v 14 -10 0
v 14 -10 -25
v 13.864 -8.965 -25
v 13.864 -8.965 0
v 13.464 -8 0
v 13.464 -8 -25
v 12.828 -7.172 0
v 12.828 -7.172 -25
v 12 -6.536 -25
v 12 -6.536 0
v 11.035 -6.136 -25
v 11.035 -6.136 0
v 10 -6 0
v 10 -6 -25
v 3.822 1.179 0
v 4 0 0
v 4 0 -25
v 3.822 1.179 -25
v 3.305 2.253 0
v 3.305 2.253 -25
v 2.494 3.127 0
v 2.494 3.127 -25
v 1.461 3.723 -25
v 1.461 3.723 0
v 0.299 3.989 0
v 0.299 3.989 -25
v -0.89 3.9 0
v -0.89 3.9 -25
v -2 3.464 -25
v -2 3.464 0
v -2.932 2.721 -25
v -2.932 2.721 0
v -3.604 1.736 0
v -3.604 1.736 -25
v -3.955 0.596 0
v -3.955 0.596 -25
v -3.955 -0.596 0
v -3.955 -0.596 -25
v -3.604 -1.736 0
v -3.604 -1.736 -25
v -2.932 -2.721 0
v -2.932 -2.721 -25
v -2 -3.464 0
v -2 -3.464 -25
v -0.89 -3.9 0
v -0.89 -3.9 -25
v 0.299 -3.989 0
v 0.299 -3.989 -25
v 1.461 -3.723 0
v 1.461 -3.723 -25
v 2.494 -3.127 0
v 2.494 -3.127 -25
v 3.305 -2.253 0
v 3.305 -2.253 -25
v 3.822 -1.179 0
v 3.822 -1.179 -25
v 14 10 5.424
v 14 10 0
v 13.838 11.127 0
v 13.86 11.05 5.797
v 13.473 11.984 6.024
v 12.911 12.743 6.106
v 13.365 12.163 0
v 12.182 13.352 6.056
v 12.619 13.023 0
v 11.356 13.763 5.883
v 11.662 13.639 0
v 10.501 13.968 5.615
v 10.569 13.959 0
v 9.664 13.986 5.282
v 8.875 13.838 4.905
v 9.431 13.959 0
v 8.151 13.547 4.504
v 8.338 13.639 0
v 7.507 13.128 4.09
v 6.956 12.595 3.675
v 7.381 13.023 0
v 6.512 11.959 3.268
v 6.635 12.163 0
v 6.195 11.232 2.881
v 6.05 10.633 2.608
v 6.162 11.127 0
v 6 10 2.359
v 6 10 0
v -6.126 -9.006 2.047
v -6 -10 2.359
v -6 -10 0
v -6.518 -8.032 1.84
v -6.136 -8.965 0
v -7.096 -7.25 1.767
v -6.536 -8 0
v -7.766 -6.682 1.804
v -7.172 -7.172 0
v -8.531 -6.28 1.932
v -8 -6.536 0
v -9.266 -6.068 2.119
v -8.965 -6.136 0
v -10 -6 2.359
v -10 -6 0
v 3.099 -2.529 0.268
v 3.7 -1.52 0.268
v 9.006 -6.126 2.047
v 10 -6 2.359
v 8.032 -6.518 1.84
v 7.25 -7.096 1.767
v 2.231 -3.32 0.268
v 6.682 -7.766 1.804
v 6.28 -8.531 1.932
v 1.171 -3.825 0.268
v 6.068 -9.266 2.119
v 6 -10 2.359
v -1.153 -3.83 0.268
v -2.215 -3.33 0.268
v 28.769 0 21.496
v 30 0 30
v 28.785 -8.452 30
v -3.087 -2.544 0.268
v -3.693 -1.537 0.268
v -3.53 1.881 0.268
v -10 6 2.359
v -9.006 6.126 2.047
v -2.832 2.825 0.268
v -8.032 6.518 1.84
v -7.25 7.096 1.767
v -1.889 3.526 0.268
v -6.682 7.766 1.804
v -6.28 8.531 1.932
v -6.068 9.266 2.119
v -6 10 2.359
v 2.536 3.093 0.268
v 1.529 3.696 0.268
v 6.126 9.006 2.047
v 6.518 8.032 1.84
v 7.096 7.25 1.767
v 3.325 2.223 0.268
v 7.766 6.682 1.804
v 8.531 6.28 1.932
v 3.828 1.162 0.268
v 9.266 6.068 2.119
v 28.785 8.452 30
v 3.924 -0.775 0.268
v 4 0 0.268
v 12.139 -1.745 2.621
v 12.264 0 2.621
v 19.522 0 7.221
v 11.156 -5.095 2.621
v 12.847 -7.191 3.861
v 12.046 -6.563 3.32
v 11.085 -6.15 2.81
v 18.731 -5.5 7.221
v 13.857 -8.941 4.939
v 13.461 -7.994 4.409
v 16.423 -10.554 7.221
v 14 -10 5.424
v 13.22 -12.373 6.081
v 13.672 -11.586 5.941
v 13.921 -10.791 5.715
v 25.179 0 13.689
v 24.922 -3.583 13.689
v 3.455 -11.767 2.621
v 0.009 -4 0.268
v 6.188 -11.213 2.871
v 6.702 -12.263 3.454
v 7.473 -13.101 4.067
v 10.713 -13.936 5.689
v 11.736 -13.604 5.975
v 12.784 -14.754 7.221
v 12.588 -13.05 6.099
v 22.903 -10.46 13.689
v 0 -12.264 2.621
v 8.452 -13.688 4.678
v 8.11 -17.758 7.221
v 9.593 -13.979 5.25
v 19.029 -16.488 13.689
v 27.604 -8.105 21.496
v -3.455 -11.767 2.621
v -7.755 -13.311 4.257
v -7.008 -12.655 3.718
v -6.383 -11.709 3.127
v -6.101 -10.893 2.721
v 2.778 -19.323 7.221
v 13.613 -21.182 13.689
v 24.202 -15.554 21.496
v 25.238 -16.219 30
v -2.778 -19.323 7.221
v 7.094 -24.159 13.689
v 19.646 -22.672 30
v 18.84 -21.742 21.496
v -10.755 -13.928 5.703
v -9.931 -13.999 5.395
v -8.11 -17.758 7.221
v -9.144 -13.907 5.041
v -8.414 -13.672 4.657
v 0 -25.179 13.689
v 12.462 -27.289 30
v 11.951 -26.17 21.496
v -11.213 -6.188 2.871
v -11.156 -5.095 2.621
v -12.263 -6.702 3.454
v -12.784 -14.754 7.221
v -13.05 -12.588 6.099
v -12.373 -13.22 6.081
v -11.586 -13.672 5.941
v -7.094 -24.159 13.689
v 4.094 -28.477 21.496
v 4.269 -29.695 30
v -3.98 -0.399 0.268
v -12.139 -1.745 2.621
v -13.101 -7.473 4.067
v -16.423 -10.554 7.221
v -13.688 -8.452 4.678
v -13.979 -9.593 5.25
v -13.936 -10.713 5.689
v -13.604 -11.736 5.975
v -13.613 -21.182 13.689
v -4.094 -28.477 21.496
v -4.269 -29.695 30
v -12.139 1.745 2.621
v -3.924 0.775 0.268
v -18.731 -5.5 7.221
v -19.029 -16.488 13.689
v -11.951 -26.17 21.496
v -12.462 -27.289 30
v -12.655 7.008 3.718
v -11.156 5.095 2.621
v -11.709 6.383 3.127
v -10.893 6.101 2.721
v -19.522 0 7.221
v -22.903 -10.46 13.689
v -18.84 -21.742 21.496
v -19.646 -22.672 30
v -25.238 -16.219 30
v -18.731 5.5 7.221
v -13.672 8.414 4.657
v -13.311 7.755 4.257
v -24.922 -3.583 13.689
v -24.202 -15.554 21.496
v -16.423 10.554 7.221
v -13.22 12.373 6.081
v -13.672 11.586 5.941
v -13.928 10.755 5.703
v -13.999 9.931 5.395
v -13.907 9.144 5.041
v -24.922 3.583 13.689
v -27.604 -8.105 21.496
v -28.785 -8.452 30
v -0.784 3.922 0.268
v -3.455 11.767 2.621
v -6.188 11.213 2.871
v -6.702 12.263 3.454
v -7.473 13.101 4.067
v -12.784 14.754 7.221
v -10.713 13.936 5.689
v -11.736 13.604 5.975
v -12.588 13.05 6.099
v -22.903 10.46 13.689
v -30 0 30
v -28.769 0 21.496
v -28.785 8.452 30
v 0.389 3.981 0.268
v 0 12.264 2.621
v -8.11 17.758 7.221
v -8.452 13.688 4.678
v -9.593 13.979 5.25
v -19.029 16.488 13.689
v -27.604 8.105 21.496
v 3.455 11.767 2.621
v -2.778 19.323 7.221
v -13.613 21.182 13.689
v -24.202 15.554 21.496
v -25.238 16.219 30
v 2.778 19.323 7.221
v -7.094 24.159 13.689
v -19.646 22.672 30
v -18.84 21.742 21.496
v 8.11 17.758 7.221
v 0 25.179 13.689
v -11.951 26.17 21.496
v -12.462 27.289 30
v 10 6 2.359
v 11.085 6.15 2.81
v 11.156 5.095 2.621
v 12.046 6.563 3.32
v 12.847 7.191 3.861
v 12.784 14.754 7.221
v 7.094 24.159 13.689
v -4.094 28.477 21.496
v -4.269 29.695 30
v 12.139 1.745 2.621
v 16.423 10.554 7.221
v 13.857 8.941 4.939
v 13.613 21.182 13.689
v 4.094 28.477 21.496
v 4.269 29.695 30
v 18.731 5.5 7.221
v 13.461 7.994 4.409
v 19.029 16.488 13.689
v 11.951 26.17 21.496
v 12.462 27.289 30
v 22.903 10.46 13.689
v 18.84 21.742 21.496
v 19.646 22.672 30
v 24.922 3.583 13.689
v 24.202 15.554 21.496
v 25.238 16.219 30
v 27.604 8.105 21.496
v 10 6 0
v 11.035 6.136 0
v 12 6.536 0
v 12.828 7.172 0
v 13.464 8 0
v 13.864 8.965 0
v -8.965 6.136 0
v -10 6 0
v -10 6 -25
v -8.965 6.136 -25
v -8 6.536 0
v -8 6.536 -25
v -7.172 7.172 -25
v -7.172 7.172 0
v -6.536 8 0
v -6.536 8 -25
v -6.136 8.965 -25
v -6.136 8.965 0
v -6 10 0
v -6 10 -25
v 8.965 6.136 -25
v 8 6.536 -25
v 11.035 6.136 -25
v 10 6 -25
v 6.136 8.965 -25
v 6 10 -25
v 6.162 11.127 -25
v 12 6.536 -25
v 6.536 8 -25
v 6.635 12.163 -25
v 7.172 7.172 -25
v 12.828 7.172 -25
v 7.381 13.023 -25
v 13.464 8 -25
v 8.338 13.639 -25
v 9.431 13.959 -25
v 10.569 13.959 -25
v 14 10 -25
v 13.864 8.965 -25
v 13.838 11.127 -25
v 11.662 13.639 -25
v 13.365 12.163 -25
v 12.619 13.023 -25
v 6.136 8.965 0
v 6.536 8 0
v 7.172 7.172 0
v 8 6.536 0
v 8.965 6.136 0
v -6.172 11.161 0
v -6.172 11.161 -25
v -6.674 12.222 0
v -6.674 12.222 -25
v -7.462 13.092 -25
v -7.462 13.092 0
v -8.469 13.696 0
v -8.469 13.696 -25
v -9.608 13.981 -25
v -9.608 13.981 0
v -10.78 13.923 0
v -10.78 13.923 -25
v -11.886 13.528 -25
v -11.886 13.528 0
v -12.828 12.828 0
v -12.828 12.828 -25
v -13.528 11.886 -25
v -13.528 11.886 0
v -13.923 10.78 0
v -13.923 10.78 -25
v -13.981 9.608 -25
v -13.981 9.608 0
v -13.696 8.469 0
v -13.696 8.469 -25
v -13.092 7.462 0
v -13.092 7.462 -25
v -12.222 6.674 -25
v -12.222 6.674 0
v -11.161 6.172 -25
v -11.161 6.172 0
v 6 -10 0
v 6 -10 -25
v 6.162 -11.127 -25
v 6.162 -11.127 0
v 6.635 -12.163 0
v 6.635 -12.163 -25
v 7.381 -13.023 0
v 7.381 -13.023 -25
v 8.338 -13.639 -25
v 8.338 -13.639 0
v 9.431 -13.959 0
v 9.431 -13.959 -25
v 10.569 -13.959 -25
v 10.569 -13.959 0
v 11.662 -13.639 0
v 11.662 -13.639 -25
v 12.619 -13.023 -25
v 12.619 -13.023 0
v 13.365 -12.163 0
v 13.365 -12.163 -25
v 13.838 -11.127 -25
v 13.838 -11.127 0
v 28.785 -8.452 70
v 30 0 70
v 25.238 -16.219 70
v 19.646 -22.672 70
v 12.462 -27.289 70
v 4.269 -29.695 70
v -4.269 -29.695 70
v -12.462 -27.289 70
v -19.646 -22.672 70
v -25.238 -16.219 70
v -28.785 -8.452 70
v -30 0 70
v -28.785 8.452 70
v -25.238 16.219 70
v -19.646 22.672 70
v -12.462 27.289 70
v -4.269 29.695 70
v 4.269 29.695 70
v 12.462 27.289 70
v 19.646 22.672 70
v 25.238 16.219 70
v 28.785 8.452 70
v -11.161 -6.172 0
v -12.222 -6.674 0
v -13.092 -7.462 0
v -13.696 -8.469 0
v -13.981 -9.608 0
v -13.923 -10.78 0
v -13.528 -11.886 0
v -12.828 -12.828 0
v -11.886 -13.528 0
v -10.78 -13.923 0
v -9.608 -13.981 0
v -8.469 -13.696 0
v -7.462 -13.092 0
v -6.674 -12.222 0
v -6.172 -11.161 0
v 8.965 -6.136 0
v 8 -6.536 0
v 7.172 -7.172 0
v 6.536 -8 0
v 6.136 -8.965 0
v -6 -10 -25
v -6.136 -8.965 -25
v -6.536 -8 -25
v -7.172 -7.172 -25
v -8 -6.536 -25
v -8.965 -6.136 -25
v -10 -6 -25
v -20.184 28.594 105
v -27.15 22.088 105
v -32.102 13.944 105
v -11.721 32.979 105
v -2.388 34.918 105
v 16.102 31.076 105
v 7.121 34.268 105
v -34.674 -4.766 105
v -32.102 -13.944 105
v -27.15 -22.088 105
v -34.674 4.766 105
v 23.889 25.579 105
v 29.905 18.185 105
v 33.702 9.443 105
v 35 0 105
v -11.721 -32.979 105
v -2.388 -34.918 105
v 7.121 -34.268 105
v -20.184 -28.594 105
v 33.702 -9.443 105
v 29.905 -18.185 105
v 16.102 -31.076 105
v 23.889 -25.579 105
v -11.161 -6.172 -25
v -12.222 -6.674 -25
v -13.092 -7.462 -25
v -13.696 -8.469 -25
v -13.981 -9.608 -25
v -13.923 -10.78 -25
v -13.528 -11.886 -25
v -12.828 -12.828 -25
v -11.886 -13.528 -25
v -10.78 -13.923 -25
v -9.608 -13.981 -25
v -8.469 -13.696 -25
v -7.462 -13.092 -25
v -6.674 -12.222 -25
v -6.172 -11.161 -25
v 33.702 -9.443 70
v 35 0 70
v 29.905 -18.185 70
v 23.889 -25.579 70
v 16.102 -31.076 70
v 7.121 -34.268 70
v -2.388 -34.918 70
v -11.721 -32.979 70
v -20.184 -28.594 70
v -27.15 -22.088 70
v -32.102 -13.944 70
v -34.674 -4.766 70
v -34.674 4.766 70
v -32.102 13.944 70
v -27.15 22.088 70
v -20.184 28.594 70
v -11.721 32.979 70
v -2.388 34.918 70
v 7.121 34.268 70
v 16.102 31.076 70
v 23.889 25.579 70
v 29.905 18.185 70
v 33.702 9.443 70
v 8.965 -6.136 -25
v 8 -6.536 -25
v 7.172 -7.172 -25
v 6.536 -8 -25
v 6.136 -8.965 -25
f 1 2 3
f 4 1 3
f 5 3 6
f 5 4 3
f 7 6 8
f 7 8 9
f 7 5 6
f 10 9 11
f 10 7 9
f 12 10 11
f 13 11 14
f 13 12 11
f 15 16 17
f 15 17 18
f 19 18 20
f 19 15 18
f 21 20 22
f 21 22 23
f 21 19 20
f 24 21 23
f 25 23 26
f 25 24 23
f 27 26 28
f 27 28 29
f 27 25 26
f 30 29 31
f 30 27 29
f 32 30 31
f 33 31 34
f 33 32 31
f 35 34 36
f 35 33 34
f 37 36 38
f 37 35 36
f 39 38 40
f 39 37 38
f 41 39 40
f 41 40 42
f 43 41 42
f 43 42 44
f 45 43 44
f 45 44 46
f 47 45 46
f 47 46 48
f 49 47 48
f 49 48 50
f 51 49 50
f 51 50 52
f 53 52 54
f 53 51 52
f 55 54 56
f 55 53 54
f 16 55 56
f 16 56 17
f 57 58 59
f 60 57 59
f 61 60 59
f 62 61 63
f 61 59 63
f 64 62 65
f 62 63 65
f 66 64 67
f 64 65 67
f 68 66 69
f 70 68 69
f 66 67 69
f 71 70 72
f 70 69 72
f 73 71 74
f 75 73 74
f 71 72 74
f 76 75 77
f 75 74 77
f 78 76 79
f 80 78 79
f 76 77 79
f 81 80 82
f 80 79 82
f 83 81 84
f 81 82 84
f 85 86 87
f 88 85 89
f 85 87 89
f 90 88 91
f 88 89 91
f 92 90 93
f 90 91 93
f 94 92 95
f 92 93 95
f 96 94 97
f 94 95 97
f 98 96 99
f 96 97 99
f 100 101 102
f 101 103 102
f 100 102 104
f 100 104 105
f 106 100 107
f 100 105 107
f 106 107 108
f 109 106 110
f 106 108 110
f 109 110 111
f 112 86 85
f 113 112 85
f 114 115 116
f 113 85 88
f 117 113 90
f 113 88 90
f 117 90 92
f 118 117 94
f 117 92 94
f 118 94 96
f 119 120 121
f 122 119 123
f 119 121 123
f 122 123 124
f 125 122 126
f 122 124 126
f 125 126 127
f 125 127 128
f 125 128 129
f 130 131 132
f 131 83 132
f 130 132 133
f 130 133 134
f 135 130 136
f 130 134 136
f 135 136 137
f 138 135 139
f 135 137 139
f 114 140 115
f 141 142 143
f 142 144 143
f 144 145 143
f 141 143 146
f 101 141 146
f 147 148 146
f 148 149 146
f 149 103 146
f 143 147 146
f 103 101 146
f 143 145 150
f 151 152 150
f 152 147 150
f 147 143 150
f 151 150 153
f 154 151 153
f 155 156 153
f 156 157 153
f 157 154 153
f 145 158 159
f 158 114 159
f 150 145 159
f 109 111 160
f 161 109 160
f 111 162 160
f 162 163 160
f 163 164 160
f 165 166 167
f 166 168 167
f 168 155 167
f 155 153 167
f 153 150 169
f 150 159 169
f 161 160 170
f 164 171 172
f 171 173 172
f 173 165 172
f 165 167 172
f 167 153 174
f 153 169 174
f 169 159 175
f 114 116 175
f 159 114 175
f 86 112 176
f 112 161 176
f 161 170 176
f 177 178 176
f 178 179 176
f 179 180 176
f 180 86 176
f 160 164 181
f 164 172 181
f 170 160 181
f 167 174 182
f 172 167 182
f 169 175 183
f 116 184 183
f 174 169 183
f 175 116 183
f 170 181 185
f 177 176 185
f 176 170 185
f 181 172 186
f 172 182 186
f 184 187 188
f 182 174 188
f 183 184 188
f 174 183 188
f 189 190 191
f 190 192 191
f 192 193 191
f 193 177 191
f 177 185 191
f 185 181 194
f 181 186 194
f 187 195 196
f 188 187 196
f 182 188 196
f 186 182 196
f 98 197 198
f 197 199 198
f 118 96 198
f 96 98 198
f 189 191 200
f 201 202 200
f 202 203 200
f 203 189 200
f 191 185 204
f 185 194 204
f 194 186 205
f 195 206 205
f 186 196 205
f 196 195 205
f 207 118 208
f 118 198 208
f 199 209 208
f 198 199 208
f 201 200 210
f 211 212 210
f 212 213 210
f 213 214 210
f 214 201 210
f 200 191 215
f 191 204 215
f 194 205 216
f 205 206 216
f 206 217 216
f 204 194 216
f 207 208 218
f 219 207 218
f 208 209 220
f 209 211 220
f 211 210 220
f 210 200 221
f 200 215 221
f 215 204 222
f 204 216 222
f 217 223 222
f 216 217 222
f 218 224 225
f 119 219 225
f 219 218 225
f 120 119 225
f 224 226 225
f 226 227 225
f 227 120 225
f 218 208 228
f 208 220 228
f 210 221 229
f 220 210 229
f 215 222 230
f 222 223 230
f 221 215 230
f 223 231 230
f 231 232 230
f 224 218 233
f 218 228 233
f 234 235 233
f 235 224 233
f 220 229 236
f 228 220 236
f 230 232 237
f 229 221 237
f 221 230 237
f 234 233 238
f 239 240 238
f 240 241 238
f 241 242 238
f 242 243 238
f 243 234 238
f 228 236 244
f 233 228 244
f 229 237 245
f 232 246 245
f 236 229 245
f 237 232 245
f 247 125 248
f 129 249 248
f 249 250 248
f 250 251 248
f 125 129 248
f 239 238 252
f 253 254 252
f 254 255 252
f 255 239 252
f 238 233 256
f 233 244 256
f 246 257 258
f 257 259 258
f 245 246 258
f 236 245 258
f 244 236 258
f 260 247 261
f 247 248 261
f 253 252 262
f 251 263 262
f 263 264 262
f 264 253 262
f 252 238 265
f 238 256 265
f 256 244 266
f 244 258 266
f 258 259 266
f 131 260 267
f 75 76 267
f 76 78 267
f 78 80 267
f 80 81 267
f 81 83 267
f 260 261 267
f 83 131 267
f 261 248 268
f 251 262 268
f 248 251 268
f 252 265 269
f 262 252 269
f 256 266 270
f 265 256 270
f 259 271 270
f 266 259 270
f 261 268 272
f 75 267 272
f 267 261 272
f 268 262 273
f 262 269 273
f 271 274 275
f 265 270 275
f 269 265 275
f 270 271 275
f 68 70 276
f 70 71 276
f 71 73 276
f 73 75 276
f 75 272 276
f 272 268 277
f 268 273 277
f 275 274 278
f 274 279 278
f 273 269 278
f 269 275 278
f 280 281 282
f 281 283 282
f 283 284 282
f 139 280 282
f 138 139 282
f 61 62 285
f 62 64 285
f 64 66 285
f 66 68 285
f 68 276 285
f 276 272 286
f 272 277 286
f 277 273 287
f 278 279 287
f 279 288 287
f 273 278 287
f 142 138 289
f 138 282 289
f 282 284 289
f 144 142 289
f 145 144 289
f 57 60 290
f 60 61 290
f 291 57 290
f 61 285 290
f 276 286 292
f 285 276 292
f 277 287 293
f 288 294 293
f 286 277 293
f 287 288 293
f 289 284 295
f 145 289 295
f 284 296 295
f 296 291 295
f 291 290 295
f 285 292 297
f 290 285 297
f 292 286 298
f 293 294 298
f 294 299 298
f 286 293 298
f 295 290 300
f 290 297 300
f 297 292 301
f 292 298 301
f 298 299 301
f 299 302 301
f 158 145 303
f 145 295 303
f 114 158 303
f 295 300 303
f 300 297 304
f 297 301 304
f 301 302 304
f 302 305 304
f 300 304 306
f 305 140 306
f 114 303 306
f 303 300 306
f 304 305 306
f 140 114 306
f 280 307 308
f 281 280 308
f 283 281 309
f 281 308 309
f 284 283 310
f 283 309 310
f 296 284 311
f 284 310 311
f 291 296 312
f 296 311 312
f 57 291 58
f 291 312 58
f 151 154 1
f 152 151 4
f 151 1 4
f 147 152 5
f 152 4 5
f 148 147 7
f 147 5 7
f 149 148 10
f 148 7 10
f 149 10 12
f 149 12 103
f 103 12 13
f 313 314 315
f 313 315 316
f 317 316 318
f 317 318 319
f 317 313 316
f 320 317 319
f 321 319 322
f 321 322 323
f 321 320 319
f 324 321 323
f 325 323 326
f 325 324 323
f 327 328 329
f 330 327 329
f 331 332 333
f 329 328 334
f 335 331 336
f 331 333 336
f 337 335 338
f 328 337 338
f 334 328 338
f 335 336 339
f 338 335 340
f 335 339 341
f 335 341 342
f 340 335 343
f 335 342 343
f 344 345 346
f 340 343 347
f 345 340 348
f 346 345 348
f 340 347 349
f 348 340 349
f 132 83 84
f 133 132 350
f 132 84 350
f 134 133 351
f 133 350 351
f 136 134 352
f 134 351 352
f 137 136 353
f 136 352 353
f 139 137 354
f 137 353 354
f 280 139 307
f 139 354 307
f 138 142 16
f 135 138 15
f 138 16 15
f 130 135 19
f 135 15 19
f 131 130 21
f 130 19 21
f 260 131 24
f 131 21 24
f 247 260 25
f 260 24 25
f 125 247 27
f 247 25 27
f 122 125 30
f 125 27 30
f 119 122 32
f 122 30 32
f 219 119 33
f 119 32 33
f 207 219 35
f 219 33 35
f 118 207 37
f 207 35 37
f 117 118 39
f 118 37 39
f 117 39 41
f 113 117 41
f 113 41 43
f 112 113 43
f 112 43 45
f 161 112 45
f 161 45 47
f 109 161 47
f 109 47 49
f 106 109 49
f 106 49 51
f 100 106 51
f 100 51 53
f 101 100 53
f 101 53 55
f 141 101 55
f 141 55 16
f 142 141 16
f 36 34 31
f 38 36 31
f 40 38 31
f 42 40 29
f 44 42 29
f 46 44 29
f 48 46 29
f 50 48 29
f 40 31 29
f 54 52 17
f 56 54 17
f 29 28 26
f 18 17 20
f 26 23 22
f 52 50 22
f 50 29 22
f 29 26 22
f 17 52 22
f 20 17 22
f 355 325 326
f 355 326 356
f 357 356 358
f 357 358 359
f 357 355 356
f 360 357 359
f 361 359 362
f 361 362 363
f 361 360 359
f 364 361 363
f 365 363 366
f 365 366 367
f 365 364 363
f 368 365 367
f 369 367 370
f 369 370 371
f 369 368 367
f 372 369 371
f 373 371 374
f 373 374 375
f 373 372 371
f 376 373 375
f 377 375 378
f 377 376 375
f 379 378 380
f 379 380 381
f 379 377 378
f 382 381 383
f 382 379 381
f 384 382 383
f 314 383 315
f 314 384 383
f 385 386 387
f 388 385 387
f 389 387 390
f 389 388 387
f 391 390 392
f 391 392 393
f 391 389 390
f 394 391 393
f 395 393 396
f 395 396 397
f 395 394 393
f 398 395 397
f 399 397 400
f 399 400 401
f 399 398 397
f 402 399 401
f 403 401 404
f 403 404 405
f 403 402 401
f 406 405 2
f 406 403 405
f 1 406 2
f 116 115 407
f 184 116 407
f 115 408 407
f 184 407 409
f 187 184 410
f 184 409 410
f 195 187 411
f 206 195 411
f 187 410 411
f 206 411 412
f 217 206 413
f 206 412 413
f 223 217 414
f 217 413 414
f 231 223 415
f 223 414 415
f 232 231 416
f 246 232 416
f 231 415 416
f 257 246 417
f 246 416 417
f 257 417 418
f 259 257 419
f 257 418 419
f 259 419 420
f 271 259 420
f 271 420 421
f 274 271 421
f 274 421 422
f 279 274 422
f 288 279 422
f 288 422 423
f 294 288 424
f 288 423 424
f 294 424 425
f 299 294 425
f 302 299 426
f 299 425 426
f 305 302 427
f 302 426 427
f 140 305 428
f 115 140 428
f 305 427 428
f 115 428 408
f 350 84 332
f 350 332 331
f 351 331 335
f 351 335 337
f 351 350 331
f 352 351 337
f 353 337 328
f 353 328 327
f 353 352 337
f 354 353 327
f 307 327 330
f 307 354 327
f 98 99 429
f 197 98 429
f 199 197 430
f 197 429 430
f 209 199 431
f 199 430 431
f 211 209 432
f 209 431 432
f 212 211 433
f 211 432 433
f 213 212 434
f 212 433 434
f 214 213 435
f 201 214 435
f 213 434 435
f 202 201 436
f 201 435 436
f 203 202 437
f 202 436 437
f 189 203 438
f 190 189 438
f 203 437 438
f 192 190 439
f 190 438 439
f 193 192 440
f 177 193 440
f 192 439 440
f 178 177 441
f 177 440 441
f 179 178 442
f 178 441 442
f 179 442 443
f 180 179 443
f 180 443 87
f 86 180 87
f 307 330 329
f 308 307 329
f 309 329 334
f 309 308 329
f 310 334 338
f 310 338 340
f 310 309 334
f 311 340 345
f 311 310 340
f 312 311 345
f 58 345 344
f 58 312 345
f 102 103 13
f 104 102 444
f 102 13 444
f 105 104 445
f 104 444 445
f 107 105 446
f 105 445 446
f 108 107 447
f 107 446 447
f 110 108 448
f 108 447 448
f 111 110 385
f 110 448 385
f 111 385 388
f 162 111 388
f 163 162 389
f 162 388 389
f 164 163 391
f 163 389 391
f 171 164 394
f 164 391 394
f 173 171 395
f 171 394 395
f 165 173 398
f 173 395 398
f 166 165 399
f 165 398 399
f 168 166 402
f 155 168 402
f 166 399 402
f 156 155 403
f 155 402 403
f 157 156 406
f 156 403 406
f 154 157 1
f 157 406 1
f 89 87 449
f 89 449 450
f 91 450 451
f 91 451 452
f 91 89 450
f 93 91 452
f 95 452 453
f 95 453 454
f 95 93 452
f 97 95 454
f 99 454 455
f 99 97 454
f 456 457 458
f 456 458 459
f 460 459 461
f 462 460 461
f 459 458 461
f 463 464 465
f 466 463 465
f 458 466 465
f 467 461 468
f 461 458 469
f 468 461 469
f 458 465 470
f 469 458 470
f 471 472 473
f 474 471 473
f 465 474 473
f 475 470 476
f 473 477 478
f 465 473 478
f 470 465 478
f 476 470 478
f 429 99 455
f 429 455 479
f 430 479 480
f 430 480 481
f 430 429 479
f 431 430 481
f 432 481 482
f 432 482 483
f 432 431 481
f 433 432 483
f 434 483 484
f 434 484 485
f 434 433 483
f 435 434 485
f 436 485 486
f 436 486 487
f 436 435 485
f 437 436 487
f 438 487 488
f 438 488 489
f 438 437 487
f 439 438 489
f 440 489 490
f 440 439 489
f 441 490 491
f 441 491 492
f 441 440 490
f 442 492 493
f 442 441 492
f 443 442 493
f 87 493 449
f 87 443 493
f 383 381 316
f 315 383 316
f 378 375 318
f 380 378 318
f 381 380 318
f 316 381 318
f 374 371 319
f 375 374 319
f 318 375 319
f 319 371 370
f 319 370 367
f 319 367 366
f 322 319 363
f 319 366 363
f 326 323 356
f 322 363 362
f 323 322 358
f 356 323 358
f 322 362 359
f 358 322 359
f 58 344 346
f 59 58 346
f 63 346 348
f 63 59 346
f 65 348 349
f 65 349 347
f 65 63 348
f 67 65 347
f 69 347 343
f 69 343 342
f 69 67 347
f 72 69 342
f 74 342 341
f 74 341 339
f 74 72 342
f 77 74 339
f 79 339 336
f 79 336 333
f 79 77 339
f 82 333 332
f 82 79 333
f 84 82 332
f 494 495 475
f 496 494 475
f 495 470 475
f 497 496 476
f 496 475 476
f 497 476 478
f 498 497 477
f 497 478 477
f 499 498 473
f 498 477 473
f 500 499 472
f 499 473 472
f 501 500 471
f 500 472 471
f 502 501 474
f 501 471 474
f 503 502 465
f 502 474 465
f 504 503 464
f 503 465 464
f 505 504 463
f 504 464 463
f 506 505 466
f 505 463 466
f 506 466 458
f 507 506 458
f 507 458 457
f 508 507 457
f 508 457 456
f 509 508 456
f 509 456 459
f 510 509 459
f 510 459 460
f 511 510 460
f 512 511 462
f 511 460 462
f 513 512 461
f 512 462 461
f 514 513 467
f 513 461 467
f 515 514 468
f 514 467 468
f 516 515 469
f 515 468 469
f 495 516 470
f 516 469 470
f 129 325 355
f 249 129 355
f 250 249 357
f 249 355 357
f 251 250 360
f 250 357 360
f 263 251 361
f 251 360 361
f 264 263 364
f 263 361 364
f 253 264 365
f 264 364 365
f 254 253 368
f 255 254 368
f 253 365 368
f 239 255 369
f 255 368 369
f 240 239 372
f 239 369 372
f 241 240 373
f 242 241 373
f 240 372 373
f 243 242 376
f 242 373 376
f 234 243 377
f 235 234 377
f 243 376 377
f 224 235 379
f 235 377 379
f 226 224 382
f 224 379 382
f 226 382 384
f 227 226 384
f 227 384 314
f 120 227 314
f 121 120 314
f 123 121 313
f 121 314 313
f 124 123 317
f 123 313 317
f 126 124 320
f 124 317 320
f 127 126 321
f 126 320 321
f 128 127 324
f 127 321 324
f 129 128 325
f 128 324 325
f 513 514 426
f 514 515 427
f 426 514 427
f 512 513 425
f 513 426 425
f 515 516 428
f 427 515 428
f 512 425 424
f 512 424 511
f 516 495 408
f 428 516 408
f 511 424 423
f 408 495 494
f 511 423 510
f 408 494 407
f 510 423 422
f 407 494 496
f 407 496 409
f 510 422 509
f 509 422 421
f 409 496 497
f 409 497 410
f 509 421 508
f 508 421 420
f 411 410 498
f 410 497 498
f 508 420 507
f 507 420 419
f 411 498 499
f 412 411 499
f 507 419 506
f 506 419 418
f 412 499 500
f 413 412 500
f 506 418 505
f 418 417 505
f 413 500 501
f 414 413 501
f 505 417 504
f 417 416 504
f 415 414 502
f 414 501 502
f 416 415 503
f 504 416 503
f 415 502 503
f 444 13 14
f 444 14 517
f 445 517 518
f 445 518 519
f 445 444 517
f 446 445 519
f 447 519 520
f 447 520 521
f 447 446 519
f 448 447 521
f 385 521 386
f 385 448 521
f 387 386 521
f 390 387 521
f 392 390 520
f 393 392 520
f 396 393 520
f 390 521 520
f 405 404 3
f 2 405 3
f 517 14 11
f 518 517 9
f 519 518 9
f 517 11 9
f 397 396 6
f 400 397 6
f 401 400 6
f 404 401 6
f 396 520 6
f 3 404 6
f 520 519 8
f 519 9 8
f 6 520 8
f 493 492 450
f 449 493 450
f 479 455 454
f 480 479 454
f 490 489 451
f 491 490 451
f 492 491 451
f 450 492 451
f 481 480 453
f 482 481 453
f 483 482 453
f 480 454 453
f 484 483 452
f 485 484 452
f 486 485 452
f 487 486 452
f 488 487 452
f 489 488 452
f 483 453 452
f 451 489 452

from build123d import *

# Parameters (mm, degrees)
F0_W     = 30
F0_H     = 40
F2_R     = 4
F3_DEPTH = 25
F4_DEPTH = 25


with BuildPart() as f1:
    # F0 (on Front) → F1 (revolve)
    with BuildSketch(Plane.XZ):
        Polygon((0, 105), (0, 70), (30, 70), (35, 70), (35, 105), align=None)
        with Locations((15, 50)):
            Rectangle(F0_W, F0_H)
        with BuildLine():
            Line((30, 30), (0, 30))
            Line((0, 30), (0, 0))
            ThreePointArc((0, 0), (21.2132034356, 8.7867965644), (30, 30))
        make_face()
    revolve(axis=Axis((0, 0, 50), (0, 0, -1)))

    # F2 (on Top) → F3 (join)
    with BuildSketch(Plane.XY):
        with BuildLine():
            ThreePointArc((14, 10), (10, 14), (6, 10))
            Line((6, 10), (10, 10))
            Line((10, 10), (10, 6))
            ThreePointArc((10, 6), (12.8284271247, 7.1715728753), (14, 10))
        make_face()
        with BuildLine():
            Line((-10, 10), (-6, 10))
            ThreePointArc((-6, 10), (-12.8284271247, 12.8284271247), (-10, 6))
            Line((-10, 6), (-10, 10))
        make_face()
        with BuildLine():
            ThreePointArc((14, -10), (12.8284271247, -7.1715728753), (10, -6))
            Line((10, -6), (10, -10))
            Line((10, -10), (6, -10))
            ThreePointArc((6, -10), (10, -14), (14, -10))
        make_face()
        with BuildLine():
            Line((-10, -10), (-10, -6))
            ThreePointArc((-10, -6), (-12.8284271247, -12.8284271247), (-6, -10))
            Line((-6, -10), (-10, -10))
        make_face()
        with BuildLine():
            Line((10, 10), (6, 10))
            ThreePointArc((6, 10), (7.1715728753, 7.1715728753), (10, 6))
            Line((10, 6), (10, 10))
        make_face()
        with BuildLine():
            ThreePointArc((-10, 6), (-7.1715728753, 7.1715728753), (-6, 10))
            Line((-6, 10), (-10, 10))
            Line((-10, 10), (-10, 6))
        make_face()
        with BuildLine():
            Line((10, -10), (10, -6))
            ThreePointArc((10, -6), (7.1715728753, -7.1715728753), (6, -10))
            Line((6, -10), (10, -10))
        make_face()
        with BuildLine():
            ThreePointArc((-6, -10), (-7.1715728753, -7.1715728753), (-10, -6))
            Line((-10, -6), (-10, -10))
            Line((-10, -10), (-6, -10))
        make_face()
        Circle(F2_R)
    extrude(amount=F3_DEPTH)

    # F4 (add): faces of the model
    f4_faces = [f1.faces().sort_by_distance(p)[0] for p in [
        (-10, -10, 0),
        (0, 0, 0),
        (-10, 10, 0),
        (10, -10, 0),
        (10, 10, 0),
    ]]
    extrude(f4_faces, amount=F4_DEPTH)


solid = f1.part
